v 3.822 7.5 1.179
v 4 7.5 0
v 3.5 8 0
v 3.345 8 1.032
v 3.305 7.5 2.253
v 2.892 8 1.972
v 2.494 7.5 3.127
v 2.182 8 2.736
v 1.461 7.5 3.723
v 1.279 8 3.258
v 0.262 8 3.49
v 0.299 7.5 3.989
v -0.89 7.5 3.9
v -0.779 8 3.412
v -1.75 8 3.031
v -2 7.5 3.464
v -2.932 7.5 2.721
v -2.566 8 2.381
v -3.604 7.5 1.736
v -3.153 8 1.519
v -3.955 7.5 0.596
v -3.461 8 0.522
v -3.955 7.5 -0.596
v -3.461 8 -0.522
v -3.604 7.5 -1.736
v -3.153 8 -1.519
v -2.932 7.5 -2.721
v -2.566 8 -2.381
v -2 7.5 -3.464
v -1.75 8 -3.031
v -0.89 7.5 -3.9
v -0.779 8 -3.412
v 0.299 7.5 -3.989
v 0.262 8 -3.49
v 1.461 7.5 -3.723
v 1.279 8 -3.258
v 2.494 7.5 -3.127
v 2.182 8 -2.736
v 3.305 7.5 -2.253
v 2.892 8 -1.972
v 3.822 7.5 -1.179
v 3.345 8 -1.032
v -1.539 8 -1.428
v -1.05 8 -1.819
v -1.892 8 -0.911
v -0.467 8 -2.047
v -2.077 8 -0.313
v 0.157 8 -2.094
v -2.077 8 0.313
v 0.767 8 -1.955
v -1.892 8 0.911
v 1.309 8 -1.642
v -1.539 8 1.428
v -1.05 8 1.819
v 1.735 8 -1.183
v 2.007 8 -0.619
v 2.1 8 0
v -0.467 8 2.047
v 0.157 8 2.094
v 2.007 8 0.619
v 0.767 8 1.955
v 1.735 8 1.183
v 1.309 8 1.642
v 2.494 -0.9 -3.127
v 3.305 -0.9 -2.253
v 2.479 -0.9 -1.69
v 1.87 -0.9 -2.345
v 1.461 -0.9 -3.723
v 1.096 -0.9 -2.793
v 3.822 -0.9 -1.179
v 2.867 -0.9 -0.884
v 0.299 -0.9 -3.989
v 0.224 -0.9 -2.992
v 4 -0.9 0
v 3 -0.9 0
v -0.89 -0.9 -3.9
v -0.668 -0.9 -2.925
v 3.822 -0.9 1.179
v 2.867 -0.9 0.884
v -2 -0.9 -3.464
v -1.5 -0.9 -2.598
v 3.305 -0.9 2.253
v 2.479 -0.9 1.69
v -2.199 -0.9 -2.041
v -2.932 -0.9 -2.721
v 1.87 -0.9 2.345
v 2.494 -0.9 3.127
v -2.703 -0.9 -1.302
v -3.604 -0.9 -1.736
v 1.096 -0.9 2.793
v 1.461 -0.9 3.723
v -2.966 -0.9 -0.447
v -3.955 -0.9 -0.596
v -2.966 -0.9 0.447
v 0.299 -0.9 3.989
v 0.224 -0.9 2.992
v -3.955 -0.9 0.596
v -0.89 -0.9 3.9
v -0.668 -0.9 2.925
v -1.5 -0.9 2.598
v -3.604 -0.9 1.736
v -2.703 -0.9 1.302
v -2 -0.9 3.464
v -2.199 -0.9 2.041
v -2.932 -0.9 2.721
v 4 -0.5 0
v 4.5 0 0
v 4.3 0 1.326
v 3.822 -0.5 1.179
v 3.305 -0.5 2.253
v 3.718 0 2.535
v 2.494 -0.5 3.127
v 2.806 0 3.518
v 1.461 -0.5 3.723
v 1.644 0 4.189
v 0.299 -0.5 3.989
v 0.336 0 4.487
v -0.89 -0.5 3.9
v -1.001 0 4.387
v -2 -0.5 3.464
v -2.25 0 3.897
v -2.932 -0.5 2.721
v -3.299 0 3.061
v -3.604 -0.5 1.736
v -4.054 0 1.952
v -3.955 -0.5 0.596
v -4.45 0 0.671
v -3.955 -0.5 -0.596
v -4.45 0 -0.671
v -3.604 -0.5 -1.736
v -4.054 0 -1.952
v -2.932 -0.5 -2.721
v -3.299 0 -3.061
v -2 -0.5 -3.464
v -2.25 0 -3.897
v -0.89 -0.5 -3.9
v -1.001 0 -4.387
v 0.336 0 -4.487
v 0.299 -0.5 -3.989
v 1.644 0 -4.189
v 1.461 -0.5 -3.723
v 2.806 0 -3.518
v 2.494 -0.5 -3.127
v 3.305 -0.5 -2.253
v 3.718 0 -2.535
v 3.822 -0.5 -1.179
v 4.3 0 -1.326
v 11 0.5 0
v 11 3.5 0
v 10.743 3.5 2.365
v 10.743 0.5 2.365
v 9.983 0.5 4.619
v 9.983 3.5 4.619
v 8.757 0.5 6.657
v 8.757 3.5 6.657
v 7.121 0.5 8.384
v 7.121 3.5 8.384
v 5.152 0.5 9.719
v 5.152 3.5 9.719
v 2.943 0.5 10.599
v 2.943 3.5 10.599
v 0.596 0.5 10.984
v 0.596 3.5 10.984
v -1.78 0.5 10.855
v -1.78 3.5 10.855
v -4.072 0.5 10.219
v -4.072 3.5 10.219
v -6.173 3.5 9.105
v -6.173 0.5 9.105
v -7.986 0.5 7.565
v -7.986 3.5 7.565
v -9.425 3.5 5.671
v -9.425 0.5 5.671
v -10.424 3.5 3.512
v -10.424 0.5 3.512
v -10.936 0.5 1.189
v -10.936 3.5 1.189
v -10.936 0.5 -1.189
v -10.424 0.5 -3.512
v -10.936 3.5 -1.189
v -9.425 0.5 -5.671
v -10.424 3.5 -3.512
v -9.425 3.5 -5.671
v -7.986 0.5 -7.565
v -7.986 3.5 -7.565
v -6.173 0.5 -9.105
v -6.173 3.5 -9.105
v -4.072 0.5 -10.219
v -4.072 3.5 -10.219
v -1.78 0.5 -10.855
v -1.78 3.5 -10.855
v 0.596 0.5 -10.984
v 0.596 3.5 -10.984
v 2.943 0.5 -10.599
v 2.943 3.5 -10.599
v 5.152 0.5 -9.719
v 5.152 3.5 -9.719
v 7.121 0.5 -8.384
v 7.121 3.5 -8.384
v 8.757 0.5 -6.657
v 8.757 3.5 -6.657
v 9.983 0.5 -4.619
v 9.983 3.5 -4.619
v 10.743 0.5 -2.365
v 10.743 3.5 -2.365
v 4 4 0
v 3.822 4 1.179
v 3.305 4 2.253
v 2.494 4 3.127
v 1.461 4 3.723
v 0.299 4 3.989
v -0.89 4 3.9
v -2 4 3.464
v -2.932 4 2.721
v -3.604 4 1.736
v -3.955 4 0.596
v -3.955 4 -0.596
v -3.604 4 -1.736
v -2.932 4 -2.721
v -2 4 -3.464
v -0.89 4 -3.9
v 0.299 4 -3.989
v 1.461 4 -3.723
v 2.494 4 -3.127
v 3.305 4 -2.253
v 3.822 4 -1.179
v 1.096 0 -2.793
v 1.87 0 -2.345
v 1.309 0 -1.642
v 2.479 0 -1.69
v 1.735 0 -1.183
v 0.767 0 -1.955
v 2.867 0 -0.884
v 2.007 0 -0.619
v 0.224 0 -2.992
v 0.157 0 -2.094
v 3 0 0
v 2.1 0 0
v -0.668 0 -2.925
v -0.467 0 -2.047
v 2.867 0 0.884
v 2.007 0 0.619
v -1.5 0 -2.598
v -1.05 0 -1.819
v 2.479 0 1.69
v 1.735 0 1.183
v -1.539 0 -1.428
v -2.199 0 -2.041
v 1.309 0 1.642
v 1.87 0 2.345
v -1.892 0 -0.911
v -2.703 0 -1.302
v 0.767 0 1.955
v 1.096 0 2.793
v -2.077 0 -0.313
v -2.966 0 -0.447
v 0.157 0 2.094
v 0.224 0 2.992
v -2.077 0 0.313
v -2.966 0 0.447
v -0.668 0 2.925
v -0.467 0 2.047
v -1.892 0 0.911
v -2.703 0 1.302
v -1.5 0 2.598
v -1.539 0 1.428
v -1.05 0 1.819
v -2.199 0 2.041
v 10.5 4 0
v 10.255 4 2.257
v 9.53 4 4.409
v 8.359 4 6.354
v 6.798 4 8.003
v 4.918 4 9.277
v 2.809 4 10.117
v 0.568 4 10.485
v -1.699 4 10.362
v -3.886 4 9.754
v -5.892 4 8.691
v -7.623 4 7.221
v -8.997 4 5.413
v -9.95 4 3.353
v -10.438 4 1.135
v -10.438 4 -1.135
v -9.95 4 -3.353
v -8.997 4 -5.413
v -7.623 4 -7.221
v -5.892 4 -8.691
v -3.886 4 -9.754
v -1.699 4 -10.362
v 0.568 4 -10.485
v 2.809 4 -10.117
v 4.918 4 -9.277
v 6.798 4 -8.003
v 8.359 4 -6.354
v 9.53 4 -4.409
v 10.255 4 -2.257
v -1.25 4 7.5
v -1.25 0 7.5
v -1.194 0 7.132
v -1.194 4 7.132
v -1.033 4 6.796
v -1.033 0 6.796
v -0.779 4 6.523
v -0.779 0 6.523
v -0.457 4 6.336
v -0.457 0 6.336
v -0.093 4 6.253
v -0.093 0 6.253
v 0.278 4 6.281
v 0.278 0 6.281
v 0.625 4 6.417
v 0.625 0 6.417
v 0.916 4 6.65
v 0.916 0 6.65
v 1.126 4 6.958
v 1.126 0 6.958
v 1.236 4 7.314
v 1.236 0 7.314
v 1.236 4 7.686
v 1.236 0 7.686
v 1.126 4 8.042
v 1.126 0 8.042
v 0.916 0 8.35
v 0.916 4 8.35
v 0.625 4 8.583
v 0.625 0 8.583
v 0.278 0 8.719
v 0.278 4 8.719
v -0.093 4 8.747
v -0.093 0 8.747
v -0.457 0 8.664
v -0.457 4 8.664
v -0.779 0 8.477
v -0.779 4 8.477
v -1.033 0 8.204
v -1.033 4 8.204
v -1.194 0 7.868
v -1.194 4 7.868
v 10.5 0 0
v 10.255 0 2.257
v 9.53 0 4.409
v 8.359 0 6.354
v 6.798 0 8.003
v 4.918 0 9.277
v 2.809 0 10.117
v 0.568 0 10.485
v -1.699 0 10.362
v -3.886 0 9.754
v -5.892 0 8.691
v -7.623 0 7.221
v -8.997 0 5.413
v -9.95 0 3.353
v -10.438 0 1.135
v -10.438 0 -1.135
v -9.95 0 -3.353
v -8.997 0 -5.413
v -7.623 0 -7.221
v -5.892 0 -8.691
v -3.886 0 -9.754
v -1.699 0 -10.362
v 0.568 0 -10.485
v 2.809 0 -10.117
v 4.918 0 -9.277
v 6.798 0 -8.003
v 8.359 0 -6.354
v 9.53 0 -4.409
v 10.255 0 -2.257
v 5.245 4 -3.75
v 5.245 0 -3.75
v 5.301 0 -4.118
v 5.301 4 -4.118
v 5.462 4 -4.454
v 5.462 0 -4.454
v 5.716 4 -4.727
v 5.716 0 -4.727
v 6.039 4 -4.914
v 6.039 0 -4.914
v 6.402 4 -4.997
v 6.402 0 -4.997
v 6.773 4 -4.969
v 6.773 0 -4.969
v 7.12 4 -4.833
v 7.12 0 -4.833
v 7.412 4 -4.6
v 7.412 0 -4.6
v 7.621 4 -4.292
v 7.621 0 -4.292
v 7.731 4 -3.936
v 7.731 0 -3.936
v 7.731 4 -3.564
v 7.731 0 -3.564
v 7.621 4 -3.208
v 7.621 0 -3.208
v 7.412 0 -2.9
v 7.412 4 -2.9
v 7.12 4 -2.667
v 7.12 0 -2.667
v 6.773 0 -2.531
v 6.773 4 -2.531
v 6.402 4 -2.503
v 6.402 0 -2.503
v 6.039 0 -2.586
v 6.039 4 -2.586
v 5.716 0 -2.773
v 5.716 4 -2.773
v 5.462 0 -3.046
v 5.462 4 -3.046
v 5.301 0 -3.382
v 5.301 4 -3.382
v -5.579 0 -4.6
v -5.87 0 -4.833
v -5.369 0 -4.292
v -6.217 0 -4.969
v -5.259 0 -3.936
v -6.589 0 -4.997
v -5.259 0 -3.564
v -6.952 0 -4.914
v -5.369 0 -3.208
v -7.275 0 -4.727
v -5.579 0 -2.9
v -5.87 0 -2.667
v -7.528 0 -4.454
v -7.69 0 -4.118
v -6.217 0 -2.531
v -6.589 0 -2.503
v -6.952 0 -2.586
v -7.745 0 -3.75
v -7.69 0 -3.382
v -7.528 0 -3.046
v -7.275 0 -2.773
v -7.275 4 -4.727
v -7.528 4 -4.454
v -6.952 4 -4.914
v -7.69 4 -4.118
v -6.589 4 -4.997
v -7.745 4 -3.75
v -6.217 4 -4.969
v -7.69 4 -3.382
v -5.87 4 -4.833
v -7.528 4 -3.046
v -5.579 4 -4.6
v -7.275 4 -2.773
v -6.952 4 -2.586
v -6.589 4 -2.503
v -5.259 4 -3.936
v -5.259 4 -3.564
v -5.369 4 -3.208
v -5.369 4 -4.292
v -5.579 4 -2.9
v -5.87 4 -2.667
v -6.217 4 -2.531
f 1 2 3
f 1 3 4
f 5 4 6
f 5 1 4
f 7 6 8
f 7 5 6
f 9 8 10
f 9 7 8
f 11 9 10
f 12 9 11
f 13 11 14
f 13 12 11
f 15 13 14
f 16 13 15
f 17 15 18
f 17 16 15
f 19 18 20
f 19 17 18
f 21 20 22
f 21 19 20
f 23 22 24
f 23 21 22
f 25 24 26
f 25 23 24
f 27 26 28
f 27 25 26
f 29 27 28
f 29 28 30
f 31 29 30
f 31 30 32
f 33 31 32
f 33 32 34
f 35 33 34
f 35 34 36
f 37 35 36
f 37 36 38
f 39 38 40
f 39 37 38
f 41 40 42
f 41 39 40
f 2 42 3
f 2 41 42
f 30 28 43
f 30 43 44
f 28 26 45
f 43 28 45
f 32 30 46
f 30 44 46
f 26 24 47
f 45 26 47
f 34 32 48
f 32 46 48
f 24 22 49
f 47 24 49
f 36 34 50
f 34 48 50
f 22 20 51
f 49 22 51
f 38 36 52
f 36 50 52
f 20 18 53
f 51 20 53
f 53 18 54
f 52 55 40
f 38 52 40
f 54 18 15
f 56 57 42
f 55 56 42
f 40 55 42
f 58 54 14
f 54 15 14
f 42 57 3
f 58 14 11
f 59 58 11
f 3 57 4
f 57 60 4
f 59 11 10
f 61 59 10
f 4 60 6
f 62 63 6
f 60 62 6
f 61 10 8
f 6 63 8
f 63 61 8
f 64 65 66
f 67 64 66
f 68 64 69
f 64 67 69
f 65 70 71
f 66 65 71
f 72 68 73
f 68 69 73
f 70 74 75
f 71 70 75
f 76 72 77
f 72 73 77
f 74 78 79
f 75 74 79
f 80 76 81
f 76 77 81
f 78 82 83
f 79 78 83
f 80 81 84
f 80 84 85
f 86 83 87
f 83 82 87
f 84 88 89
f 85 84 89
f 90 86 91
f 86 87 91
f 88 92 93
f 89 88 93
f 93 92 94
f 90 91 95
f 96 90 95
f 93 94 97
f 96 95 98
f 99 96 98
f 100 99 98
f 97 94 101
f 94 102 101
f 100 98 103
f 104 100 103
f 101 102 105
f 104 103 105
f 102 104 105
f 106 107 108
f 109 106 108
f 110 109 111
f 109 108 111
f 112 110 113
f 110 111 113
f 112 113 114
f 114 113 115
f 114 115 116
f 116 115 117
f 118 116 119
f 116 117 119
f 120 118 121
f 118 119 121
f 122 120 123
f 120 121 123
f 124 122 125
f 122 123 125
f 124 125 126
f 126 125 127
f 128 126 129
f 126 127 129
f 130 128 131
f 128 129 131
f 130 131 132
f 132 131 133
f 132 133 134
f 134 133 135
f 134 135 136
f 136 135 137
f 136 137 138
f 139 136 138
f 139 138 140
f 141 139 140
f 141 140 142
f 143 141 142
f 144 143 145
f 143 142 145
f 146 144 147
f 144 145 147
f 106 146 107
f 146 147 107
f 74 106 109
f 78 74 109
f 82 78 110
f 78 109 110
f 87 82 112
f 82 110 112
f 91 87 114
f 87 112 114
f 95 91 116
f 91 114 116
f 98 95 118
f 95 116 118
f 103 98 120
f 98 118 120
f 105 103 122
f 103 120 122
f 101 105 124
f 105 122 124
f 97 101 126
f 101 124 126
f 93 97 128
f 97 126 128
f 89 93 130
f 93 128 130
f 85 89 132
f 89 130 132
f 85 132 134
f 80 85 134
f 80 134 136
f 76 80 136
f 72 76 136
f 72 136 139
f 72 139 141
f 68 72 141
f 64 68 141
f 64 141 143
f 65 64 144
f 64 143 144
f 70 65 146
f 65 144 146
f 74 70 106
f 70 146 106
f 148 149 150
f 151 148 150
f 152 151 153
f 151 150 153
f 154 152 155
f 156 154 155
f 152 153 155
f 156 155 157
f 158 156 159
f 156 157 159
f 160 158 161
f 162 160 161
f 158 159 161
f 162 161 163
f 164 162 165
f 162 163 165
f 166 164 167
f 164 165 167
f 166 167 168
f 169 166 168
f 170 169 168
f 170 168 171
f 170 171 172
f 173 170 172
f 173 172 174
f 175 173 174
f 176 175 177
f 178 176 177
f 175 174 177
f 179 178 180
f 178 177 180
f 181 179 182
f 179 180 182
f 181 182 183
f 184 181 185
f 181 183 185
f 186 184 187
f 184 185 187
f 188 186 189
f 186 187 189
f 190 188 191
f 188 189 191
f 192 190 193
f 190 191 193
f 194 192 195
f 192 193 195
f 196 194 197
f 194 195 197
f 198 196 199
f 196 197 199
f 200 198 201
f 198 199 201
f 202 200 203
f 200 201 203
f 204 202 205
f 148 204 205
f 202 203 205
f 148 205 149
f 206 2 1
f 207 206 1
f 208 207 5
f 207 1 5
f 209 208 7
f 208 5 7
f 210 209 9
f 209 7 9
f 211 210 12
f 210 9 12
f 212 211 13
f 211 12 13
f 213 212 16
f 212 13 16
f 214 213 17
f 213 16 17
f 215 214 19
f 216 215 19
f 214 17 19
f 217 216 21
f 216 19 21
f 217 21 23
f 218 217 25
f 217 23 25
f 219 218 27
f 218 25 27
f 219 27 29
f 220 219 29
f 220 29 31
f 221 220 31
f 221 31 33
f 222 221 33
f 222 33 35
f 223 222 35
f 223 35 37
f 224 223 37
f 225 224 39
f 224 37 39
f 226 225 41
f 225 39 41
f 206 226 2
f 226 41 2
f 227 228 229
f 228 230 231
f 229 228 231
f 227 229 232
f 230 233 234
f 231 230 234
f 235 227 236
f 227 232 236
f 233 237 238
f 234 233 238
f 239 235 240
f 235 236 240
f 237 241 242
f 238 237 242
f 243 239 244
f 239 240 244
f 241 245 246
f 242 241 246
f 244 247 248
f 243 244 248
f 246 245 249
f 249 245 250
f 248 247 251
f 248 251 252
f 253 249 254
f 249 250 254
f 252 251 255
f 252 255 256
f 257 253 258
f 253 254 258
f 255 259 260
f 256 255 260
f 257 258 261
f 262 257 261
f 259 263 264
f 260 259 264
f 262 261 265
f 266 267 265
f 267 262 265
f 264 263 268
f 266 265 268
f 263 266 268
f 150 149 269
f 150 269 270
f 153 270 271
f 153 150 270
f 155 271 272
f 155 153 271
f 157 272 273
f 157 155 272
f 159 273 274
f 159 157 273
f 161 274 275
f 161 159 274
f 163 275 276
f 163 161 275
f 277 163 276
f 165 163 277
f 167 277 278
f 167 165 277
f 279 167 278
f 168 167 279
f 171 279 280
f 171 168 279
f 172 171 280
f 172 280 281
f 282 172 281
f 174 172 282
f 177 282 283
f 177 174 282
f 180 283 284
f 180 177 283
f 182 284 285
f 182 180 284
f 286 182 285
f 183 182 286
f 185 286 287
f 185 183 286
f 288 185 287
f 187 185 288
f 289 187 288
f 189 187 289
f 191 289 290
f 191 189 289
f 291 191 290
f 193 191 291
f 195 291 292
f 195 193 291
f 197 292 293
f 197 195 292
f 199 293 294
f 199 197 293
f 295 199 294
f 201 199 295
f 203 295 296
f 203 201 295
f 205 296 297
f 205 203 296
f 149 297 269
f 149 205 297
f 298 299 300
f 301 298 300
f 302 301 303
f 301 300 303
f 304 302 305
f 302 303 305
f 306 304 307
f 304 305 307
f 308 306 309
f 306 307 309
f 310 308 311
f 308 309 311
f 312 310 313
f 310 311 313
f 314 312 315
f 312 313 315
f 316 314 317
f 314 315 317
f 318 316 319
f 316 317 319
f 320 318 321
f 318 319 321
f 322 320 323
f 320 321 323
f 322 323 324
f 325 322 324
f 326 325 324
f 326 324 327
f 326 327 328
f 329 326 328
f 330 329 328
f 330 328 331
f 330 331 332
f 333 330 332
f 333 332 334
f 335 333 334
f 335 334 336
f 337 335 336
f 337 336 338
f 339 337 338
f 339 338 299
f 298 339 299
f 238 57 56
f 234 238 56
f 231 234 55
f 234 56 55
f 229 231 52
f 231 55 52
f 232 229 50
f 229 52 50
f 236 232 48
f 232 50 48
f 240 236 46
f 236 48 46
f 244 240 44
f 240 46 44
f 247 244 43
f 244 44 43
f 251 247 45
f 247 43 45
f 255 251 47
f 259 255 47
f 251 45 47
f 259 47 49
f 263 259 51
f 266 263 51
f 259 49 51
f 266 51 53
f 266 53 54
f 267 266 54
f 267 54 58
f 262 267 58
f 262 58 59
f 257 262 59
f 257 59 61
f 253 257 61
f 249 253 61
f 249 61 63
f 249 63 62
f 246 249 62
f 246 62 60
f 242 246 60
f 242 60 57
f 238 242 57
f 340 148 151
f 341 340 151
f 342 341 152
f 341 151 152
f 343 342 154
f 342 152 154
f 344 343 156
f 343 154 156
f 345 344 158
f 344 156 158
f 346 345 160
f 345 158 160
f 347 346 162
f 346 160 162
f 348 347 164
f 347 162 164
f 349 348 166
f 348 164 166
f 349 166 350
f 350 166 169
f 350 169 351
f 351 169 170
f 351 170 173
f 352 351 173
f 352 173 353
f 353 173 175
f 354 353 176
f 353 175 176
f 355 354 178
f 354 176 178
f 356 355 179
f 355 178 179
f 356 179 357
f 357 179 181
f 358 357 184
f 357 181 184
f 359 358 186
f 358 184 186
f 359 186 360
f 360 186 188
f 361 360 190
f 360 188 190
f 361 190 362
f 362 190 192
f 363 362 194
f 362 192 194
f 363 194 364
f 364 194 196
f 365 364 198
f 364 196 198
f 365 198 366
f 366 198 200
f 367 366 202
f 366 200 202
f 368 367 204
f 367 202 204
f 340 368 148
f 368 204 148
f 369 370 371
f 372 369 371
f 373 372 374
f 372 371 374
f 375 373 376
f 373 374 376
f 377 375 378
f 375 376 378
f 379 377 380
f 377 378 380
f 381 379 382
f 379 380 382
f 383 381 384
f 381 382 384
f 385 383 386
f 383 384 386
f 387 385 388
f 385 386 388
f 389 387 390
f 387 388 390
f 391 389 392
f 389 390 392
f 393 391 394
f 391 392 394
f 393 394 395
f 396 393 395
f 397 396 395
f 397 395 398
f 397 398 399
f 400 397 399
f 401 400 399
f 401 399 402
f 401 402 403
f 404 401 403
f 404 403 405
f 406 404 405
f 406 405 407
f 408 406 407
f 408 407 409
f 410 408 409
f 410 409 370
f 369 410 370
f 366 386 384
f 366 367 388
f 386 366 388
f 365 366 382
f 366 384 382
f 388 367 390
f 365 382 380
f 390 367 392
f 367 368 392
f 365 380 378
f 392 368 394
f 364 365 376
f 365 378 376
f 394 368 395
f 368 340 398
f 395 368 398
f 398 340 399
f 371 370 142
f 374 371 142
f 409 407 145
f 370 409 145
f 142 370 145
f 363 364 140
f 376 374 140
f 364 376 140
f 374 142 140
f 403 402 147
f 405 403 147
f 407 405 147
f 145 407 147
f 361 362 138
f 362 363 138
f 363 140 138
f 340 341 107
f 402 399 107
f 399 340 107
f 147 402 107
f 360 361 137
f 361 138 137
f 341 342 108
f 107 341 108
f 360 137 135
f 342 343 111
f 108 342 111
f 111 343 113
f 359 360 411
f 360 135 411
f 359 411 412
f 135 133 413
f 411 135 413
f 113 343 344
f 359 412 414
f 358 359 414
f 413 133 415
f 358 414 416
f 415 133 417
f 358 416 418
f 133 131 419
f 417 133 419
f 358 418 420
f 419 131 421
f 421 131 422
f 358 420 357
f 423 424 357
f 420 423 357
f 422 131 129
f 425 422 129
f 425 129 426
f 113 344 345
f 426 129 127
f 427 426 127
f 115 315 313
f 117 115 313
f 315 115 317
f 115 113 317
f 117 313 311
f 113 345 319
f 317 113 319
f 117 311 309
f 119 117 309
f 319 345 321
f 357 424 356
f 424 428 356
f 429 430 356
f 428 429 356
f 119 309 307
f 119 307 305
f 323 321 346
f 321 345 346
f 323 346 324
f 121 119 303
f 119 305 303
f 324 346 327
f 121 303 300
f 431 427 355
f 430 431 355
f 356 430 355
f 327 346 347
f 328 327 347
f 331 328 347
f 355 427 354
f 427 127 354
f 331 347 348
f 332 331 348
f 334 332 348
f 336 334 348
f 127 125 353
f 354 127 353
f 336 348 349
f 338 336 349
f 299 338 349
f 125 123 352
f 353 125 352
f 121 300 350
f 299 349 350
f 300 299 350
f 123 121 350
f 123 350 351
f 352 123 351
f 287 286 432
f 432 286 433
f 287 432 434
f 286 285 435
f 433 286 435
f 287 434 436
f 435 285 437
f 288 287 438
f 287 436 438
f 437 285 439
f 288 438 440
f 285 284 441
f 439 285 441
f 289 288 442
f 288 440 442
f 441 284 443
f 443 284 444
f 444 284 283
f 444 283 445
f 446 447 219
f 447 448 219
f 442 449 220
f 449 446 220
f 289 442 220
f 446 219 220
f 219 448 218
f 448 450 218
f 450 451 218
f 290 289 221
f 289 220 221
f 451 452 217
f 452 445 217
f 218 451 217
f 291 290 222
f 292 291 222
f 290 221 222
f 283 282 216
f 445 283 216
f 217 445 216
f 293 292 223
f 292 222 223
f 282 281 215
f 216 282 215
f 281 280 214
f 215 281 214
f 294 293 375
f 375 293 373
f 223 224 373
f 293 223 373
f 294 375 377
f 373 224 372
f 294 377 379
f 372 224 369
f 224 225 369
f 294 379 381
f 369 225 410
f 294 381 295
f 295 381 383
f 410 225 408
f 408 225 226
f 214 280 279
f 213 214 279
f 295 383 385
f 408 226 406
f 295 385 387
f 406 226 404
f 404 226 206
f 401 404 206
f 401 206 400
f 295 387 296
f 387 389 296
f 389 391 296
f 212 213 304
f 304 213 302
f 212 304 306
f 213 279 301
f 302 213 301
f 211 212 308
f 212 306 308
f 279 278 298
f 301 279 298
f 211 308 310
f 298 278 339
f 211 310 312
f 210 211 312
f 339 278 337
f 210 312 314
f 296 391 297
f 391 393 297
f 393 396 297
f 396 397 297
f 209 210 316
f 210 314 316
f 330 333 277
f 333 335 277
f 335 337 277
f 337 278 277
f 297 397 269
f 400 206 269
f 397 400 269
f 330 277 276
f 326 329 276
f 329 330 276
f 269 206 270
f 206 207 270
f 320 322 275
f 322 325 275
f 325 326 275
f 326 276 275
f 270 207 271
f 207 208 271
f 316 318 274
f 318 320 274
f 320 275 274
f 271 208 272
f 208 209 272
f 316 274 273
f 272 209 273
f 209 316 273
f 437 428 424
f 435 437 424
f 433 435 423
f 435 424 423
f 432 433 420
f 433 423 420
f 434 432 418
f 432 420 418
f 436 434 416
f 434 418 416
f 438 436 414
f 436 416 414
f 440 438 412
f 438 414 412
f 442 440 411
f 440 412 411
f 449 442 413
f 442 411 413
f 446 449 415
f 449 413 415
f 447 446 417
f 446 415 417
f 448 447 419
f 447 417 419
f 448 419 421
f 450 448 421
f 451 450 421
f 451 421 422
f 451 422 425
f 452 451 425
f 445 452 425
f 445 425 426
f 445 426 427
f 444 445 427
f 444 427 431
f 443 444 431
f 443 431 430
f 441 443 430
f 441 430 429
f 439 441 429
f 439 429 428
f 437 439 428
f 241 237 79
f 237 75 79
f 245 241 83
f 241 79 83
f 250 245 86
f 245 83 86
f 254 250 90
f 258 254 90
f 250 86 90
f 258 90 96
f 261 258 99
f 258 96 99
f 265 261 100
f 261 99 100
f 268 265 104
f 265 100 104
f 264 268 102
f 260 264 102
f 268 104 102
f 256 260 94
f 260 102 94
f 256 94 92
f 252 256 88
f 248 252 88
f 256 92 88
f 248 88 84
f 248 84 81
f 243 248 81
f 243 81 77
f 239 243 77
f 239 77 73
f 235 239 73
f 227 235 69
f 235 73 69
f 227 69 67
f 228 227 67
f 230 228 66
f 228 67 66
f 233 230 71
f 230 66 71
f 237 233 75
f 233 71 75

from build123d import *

# Parameters (mm, degrees)
HOLE_WIZARD_M3_1_D = 2.5
HOLE_WIZARD_M5_1_D = 4.2
CHAMFER_1_SIZE     = 0.5


with BuildPart() as part:
    # 草图1 → 旋转1 (revolve)
    with BuildSketch(Plane.XY):
        Polygon((0, 8), (0, 0), (3, 0), (3, -0.9), (4, -0.9), (4, 0), (11, 0), (11, 4), (4, 4), (4, 8), align=None)
    revolve(axis=Axis((0, 0, 0), (0, -1, 0)))

    # M3 螺纹孔1 (through all)
    with Locations(Plane(origin=(0, 4, 0), x_dir=(1, 0, 0), z_dir=(0, 1, 0))):
        with Locations((-6.495190528, 3.75), (6.495190528, 3.75), (0, -7.5)):
            Hole(HOLE_WIZARD_M3_1_D / 2)

    # M5 螺纹孔1 (through all)
    with Locations(Plane(origin=(0, 0, 0), x_dir=(-1, 0, 0), z_dir=(0, -1, 0))):
        with Locations((0, 0)):
            Hole(HOLE_WIZARD_M5_1_D / 2)

    # 倒角1
    chamfer_1_edges = [part.edges().sort_by_distance(p)[0] for p in [
        (-4, 8, 0),
        (-11, 4, 0),
        (-11, 0, 0),
        (-4, 0, 0),
    ]]
    chamfer(chamfer_1_edges, length=CHAMFER_1_SIZE)


solid = part.part
